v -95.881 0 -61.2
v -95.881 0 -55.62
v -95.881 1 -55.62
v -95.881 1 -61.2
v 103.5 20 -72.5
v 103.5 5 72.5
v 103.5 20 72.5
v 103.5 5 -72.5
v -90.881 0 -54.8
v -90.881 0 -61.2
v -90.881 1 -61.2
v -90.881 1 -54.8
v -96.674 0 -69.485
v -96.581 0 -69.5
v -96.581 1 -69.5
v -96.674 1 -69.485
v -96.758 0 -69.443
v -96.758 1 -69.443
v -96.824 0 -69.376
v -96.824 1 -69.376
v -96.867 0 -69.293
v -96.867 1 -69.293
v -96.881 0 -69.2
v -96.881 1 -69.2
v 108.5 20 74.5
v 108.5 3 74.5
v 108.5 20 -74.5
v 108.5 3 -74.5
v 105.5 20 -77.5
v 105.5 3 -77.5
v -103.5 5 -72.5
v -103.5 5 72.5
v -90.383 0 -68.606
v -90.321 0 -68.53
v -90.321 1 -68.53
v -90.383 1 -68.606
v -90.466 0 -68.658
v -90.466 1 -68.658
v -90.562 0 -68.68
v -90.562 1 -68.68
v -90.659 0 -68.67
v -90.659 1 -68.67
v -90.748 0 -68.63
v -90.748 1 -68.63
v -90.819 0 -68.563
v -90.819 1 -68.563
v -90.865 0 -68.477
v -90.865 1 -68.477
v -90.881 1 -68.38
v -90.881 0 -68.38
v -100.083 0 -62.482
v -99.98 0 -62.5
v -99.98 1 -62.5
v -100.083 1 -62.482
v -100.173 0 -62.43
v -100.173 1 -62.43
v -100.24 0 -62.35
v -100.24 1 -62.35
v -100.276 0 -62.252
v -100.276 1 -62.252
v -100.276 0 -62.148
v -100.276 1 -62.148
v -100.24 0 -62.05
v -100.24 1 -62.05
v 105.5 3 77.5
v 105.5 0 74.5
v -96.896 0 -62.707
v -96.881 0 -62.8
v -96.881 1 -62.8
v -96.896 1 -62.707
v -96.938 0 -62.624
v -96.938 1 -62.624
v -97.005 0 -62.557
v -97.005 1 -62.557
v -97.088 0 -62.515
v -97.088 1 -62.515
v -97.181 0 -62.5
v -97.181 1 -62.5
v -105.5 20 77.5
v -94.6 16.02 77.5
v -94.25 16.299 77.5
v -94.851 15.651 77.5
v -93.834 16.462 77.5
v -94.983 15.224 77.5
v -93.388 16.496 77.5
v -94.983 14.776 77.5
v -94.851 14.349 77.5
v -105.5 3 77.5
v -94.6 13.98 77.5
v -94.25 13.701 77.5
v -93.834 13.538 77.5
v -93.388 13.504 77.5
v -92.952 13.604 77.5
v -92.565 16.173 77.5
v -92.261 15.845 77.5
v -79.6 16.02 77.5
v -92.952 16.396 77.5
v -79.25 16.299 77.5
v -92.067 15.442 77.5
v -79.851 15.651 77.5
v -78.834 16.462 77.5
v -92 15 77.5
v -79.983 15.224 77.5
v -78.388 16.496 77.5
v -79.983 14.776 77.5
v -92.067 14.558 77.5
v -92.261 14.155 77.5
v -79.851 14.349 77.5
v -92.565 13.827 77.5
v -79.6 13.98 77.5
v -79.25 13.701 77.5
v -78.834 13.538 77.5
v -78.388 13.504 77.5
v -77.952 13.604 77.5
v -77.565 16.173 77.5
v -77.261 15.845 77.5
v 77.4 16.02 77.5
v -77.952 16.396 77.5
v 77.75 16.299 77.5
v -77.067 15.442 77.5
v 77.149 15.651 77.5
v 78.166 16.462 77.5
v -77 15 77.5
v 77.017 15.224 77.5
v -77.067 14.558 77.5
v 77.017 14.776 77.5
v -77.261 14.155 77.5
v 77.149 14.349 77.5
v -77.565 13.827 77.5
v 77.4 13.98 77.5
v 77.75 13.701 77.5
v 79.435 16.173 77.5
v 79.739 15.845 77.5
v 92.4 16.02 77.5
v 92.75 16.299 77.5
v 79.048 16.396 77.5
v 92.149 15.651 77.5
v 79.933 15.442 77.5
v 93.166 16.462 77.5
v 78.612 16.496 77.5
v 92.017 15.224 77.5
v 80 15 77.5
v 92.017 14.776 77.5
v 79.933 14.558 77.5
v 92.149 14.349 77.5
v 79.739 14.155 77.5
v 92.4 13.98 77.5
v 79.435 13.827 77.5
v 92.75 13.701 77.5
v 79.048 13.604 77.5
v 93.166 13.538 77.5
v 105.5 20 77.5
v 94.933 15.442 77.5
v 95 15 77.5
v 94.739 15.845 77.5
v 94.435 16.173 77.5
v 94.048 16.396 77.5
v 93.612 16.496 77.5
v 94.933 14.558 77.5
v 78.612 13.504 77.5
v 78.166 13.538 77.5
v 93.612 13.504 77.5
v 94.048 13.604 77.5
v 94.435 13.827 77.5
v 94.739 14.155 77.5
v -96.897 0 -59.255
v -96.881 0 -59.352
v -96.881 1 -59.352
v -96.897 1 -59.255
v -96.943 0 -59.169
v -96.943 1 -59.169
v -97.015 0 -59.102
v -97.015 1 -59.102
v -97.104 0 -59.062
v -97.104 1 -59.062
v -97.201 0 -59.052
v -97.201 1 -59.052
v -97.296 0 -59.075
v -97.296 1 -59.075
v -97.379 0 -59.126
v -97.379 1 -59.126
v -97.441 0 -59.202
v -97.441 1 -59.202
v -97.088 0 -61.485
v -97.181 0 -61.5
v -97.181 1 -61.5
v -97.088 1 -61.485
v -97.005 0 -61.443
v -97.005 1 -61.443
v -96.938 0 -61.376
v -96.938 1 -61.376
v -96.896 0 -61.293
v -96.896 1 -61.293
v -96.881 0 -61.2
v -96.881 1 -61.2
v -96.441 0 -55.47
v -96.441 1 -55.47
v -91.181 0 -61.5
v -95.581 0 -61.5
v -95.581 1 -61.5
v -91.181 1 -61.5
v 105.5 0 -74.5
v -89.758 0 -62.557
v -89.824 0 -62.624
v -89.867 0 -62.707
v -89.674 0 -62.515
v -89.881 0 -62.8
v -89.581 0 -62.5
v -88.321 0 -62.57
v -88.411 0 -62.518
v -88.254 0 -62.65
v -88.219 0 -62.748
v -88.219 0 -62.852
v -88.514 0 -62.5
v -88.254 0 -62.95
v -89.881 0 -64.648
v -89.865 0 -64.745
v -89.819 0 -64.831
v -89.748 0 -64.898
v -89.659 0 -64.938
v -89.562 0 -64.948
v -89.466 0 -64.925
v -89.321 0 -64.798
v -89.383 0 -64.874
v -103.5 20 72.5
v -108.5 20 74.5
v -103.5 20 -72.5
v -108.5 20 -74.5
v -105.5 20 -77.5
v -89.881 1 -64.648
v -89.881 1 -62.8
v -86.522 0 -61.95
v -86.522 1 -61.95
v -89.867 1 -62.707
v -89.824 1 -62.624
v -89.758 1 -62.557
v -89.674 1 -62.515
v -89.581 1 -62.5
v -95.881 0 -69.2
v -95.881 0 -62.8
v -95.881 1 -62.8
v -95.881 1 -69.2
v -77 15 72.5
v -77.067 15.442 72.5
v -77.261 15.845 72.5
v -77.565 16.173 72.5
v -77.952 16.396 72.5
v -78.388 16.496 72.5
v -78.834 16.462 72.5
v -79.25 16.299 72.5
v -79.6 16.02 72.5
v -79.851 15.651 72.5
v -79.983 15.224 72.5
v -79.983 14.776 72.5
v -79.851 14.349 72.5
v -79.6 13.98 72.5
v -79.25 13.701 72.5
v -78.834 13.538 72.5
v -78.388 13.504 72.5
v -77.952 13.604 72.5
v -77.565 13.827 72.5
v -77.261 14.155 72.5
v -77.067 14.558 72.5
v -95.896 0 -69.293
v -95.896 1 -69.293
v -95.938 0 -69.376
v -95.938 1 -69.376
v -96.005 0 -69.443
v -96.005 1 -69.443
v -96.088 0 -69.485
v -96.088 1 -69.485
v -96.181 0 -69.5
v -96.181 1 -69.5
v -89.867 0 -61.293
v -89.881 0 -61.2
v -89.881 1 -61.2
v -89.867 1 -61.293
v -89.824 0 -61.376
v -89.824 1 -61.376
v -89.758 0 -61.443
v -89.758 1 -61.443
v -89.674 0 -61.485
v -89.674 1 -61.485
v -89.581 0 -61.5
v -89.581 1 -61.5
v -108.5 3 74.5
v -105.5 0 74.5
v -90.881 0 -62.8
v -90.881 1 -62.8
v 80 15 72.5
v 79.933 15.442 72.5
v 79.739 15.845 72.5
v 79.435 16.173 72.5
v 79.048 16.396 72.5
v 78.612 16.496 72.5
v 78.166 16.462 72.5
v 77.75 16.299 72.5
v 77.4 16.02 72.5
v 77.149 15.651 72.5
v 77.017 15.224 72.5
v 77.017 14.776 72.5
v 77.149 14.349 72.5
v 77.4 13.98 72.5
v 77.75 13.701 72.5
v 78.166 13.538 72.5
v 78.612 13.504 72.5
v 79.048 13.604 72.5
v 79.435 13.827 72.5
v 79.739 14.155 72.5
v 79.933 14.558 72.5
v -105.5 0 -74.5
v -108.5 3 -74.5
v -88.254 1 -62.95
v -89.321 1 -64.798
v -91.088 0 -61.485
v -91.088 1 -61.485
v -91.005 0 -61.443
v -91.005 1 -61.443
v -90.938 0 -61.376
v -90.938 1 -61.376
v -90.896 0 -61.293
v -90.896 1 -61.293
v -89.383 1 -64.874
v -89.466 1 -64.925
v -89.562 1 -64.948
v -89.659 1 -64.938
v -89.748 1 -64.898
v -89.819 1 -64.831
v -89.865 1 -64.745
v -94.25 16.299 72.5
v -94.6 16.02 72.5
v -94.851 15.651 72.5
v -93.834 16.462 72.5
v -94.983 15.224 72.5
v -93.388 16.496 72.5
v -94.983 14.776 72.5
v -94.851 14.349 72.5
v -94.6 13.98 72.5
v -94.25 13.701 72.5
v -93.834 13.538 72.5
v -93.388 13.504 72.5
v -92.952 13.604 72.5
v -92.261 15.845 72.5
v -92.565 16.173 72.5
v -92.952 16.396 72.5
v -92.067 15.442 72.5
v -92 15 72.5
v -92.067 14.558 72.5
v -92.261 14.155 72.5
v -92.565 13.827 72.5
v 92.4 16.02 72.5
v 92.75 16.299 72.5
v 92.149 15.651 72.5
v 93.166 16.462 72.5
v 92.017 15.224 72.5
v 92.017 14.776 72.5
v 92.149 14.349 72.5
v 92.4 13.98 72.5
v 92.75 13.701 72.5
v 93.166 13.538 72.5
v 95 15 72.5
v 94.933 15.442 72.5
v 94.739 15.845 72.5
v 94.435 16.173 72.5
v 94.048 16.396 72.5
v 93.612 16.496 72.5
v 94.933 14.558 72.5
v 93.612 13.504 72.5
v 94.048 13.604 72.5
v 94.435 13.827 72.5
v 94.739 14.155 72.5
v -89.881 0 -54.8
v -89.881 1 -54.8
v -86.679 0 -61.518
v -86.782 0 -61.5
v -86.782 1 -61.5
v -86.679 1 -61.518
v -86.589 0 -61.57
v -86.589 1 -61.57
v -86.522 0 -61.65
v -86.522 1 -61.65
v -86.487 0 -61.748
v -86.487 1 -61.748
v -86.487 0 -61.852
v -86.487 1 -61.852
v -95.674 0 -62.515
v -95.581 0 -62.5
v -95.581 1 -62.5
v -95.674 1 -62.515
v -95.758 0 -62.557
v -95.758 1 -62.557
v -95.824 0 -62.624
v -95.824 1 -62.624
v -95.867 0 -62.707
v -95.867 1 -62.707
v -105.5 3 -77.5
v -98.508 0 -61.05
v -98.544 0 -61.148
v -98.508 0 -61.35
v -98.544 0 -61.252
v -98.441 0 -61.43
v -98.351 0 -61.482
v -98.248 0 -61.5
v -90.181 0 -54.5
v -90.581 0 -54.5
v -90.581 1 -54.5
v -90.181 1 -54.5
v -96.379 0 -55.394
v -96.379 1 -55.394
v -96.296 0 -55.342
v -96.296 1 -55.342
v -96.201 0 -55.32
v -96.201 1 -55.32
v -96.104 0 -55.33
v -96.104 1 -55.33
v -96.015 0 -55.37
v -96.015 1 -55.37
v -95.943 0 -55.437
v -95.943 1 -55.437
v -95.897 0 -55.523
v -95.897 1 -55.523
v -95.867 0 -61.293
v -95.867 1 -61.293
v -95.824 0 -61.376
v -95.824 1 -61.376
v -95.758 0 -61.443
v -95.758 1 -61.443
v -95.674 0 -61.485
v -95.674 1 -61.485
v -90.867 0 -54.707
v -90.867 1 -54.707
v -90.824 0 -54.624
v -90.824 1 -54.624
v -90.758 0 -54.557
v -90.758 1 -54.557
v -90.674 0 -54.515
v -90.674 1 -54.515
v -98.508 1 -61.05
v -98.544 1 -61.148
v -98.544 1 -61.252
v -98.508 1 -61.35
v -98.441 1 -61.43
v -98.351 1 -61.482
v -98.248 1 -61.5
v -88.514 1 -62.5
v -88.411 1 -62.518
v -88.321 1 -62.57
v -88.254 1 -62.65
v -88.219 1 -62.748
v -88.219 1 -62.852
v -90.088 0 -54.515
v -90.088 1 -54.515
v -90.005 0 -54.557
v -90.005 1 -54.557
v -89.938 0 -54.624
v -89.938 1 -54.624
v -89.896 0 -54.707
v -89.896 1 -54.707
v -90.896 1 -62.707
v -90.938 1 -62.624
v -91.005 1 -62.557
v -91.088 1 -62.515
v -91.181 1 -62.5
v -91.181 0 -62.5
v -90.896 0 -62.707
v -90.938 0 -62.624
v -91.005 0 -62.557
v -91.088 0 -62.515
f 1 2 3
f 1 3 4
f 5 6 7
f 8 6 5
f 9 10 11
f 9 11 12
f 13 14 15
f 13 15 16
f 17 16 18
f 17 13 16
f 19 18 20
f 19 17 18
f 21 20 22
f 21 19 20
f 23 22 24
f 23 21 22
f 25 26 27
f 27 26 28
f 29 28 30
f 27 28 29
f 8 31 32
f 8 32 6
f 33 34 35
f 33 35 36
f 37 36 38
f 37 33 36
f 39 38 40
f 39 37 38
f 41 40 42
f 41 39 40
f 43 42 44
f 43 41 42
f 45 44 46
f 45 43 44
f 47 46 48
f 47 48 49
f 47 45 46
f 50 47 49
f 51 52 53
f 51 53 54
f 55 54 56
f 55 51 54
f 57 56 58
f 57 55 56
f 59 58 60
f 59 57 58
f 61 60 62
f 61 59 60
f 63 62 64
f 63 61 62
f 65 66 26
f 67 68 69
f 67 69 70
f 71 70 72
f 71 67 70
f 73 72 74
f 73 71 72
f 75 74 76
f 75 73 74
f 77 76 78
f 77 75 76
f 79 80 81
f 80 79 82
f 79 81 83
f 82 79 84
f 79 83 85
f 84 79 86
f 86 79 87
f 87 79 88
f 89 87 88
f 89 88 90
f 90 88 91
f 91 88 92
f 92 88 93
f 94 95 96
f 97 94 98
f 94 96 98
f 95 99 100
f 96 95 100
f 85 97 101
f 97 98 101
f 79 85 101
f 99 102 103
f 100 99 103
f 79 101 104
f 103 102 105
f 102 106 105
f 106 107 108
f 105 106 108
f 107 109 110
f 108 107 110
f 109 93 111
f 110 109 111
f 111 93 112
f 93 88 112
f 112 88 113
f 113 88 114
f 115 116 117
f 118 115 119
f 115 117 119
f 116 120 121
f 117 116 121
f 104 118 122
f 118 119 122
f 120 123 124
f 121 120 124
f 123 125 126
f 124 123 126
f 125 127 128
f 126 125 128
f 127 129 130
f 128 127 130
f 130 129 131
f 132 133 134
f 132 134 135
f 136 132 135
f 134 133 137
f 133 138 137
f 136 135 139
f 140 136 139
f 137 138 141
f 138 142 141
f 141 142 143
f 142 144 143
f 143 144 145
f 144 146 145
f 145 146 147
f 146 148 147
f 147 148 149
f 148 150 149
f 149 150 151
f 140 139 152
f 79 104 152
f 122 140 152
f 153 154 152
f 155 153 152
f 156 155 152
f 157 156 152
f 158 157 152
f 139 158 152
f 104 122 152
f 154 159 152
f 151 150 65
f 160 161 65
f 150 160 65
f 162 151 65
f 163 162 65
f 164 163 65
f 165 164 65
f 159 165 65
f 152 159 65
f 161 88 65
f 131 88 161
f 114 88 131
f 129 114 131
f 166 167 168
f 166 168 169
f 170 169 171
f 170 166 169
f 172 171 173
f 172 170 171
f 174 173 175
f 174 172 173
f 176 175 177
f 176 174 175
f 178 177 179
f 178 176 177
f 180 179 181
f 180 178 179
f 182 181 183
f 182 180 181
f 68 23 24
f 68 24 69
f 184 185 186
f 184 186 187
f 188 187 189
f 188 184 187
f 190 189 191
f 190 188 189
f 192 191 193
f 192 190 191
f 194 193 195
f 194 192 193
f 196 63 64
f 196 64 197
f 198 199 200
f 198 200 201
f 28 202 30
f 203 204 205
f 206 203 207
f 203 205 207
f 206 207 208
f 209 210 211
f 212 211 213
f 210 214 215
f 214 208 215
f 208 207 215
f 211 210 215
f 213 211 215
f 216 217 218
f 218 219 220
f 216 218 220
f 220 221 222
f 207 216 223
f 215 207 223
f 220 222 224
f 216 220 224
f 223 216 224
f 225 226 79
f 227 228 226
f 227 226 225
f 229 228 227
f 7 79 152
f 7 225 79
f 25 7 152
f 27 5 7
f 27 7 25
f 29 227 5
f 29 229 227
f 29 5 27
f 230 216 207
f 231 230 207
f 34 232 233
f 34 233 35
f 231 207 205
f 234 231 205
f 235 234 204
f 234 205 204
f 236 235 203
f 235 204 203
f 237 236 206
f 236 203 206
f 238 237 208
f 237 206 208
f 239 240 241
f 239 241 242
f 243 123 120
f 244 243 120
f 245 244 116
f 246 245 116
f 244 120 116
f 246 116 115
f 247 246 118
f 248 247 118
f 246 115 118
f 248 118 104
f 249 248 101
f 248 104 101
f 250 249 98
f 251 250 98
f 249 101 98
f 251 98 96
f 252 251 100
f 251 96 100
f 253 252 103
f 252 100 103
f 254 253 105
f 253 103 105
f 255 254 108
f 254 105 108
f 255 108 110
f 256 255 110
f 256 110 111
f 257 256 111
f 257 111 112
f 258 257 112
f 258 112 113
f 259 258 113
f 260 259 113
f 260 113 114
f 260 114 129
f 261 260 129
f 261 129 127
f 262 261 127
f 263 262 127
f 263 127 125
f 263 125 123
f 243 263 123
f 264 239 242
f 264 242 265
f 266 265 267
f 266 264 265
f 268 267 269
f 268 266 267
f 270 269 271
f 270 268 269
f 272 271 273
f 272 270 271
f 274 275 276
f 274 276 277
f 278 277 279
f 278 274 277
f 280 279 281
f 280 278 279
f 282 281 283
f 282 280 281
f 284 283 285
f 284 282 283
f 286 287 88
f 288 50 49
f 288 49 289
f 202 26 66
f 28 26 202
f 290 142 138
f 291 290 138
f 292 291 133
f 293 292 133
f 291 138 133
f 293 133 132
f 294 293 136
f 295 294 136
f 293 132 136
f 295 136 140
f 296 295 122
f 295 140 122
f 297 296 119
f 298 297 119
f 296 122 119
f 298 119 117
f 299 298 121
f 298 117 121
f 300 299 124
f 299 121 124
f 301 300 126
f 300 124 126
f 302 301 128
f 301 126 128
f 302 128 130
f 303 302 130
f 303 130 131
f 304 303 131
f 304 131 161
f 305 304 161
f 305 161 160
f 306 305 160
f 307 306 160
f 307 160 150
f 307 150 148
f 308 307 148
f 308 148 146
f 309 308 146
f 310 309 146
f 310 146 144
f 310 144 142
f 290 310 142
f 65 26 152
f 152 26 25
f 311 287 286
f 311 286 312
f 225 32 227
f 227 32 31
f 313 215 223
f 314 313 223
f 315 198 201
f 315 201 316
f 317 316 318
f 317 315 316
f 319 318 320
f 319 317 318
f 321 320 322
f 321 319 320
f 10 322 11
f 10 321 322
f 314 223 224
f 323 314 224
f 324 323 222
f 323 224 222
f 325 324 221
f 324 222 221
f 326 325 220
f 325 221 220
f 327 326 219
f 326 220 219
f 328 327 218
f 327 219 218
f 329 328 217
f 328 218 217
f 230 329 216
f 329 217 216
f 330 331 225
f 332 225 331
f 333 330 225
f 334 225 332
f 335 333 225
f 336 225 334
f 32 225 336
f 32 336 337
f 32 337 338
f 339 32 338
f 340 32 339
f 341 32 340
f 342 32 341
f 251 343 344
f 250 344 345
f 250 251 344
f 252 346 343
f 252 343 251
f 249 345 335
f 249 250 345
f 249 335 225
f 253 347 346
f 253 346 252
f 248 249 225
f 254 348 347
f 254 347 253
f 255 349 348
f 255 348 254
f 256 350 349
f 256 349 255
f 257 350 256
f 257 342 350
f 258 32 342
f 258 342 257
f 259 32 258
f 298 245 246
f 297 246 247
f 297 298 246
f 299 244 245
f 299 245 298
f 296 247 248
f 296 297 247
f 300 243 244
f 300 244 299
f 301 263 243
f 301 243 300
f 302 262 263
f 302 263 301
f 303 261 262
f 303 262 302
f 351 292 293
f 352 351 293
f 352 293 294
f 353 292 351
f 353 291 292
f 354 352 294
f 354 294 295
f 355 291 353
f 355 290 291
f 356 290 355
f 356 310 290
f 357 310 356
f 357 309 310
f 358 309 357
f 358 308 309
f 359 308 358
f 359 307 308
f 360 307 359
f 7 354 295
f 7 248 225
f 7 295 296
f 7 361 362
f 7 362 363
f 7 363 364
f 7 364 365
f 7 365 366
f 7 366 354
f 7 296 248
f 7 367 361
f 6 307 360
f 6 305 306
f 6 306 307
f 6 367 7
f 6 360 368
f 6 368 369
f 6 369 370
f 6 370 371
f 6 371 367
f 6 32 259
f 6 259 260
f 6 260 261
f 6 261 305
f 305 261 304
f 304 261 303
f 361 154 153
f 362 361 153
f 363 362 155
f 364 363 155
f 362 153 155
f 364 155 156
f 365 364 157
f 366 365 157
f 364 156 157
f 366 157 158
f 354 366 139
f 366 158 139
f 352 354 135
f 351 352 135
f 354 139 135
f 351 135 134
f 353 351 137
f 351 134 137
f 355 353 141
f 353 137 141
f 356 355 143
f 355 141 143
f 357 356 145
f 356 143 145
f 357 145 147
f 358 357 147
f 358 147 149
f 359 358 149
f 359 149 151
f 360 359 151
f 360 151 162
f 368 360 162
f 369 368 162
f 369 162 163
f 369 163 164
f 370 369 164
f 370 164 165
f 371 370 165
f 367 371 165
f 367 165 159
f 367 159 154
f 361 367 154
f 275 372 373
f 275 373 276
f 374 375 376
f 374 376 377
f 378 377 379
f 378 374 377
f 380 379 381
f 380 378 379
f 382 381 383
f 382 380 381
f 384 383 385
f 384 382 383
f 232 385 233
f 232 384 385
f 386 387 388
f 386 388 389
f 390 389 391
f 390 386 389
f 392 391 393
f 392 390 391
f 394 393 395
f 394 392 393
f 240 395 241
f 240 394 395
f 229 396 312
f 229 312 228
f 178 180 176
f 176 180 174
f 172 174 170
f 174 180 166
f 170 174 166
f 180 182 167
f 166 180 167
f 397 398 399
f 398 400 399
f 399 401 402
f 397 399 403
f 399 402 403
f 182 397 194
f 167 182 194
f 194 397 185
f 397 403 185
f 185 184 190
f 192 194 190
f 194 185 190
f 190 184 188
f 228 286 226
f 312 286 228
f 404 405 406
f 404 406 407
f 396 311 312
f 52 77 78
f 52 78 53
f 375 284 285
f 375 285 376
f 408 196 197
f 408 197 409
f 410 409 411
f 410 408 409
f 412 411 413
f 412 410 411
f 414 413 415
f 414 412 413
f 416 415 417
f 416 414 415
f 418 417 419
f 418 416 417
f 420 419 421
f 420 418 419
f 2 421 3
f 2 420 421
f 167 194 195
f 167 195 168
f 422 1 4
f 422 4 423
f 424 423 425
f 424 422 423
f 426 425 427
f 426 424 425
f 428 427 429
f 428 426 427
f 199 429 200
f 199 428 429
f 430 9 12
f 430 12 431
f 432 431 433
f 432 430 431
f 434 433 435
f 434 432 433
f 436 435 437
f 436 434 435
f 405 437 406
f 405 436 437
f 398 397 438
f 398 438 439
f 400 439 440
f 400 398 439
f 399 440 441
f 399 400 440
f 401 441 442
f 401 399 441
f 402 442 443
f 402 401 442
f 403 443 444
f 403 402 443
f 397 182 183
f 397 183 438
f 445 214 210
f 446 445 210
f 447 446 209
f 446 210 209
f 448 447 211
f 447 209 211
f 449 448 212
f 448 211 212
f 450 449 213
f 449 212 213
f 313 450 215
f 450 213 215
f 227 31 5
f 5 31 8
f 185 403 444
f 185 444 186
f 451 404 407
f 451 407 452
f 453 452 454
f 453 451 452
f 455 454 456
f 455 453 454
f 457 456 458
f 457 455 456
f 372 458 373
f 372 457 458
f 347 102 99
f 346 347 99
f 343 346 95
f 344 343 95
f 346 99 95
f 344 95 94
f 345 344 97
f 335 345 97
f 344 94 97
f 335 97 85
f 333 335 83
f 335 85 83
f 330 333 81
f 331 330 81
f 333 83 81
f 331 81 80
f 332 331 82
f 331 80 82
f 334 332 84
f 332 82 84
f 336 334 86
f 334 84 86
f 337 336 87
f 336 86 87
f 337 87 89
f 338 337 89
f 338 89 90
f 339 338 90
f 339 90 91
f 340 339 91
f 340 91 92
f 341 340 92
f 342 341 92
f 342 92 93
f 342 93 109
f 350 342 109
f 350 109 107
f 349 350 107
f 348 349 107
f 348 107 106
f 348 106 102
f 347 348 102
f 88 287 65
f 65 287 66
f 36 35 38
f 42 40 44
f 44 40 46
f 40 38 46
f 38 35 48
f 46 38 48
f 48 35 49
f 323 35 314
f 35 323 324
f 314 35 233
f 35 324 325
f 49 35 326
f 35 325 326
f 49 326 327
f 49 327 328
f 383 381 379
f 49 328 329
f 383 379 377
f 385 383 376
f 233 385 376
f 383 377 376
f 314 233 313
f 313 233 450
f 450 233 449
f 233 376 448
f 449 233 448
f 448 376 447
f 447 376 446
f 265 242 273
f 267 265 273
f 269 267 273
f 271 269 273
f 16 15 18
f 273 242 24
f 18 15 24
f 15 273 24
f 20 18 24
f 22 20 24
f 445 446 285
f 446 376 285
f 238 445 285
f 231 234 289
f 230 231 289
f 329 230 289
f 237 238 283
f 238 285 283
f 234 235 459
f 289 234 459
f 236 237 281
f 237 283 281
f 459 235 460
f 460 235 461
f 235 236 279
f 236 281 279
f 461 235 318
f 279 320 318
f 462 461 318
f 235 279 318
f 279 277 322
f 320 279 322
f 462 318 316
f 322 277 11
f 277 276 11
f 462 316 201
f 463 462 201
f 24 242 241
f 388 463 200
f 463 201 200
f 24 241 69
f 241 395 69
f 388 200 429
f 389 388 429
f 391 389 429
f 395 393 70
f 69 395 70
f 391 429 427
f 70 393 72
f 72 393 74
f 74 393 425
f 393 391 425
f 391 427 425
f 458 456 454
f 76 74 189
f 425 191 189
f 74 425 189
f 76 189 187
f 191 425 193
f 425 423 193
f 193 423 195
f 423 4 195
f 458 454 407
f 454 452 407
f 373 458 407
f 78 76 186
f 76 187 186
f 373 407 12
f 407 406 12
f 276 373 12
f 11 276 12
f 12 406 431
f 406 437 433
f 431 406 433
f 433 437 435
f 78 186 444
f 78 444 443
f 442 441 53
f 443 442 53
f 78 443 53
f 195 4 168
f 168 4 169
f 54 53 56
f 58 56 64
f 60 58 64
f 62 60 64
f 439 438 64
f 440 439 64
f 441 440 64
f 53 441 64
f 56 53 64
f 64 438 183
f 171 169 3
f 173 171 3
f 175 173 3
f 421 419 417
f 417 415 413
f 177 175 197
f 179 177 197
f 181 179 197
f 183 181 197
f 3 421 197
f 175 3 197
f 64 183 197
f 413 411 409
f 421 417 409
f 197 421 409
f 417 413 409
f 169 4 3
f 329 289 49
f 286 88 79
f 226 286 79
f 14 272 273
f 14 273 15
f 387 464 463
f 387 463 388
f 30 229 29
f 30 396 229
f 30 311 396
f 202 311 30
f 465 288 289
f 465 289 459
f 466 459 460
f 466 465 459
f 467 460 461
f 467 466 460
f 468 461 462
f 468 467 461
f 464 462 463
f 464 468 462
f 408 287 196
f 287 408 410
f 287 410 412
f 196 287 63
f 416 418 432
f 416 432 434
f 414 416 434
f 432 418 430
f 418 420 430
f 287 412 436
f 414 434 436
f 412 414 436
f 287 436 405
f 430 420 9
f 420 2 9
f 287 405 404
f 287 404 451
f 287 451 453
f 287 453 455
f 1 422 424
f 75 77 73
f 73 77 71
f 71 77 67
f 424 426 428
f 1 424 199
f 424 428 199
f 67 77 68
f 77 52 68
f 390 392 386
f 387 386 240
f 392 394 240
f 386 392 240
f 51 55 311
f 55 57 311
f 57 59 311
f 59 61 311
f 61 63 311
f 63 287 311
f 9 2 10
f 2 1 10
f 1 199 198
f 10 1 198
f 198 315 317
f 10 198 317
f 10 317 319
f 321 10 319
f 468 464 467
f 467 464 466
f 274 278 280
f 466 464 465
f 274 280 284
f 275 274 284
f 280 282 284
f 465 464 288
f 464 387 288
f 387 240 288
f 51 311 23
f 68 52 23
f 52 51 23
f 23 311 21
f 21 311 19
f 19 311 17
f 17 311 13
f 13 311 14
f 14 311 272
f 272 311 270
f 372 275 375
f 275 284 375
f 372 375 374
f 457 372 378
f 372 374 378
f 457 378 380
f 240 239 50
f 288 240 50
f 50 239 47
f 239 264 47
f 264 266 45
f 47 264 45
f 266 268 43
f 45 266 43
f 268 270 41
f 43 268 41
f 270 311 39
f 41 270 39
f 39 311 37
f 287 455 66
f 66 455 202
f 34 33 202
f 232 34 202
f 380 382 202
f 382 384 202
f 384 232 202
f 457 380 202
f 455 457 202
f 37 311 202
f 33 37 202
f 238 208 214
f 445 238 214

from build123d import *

# Parameters (mm, degrees)
SKIZZE2_W                       = 217
SKIZZE2_H                       = 155
AUFSATZ_LINEAR_AUSTRAGEN1_DEPTH = 20
WANDUNG1_T                      = -5
SCHNITT_LINEAR_AUSTRAGEN1_REACH = 192.256
SKIZZE7_R                       = 1.5
FASE1_SIZE                      = 3
SCHNITT_LINEAR_AUSTRAGEN2_DEPTH = 1


with BuildPart() as part:
    # Skizze2 → Aufsatz-Linear austragen1 (new body)
    with BuildSketch(Plane(origin=(0, 0, 0), x_dir=(1, 0, 0), z_dir=(0, 1, 0))):
        Rectangle(SKIZZE2_W, SKIZZE2_H)
    extrude(amount=AUFSATZ_LINEAR_AUSTRAGEN1_DEPTH)

    # Wandung1
    wandung1_openings = [part.faces().sort_by_distance(p)[0] for p in [
        (0, 20, 0),
    ]]
    offset(amount=WANDUNG1_T, openings=wandung1_openings, kind=Kind.INTERSECTION)

    # Skizze7 → Schnitt-Linear austragen1 (cut, up to next)
    with BuildSketch(Plane.XY.offset(77.5), mode=Mode.PRIVATE) as schnitt_linear_austragen1_sk1:
        with Locations((-93.5, 15)):
            Circle(SKIZZE7_R)
    schnitt_linear_austragen1_tool1 = extrude(schnitt_linear_austragen1_sk1.sketch, amount=-SCHNITT_LINEAR_AUSTRAGEN1_REACH, mode=Mode.PRIVATE) & part.part
    # Skizze7 → Schnitt-Linear austragen1 (cut, up to next)
    with BuildSketch(Plane.XY.offset(77.5), mode=Mode.PRIVATE) as schnitt_linear_austragen1_sk2:
        with Locations((-78.5, 15)):
            Circle(SKIZZE7_R)
    schnitt_linear_austragen1_tool2 = extrude(schnitt_linear_austragen1_sk2.sketch, amount=-SCHNITT_LINEAR_AUSTRAGEN1_REACH, mode=Mode.PRIVATE) & part.part
    # Skizze7 → Schnitt-Linear austragen1 (cut, up to next)
    with BuildSketch(Plane.XY.offset(77.5), mode=Mode.PRIVATE) as schnitt_linear_austragen1_sk3:
        with Locations((78.5, 15)):
            Circle(SKIZZE7_R)
    schnitt_linear_austragen1_tool3 = extrude(schnitt_linear_austragen1_sk3.sketch, amount=-SCHNITT_LINEAR_AUSTRAGEN1_REACH, mode=Mode.PRIVATE) & part.part
    # Skizze7 → Schnitt-Linear austragen1 (cut, up to next)
    with BuildSketch(Plane.XY.offset(77.5), mode=Mode.PRIVATE) as schnitt_linear_austragen1_sk4:
        with Locations((93.5, 15)):
            Circle(SKIZZE7_R)
    schnitt_linear_austragen1_tool4 = extrude(schnitt_linear_austragen1_sk4.sketch, amount=-SCHNITT_LINEAR_AUSTRAGEN1_REACH, mode=Mode.PRIVATE) & part.part
    add(schnitt_linear_austragen1_tool1.solids().sort_by_distance((-93.5, 15, 77.5))[0], mode=Mode.SUBTRACT)
    add(schnitt_linear_austragen1_tool2.solids().sort_by_distance((-78.5, 15, 77.5))[0], mode=Mode.SUBTRACT)
    add(schnitt_linear_austragen1_tool3.solids().sort_by_distance((78.5, 15, 77.5))[0], mode=Mode.SUBTRACT)
    add(schnitt_linear_austragen1_tool4.solids().sort_by_distance((93.5, 15, 77.5))[0], mode=Mode.SUBTRACT)

    # Fase1
    fase1_edges = [part.edges().sort_by_distance(p)[0] for p in [
        (0, 0, 77.5),
        (-108.5, 0, 0),
        (0, 0, -77.5),
        (108.5, 0, 0),
        (108.5, 10, 77.5),
        (-108.5, 10, 77.5),
        (-108.5, 10, -77.5),
        (108.5, 10, -77.5),
    ]]
    chamfer(fase1_edges, length=FASE1_SIZE)

    # Skizze8 → Schnitt-Linear austragen2 (cut)
    with BuildSketch(Plane.XZ):
        with BuildLine():
            Line((-96.881197846, -69.2), (-96.881197846, -62.8))
            ThreePointArc((-96.881197846, -62.8), (-96.969065812, -62.587867966), (-97.181197846, -62.5))
            Line((-97.181197846, -62.5), (-99.980384758, -62.5))
            ThreePointArc((-99.980384758, -62.5), (-100.240192379, -62.35), (-100.240192379, -62.05))
            Line((-100.240192379, -62.05), (-96.441005468, -55.469615242))
            ThreePointArc((-96.441005468, -55.469615242), (-96.103552133, -55.329837494), (-95.881197846, -55.619615242))
            Line((-95.881197846, -55.619615242), (-95.881197846, -61.2))
            ThreePointArc((-95.881197846, -61.2), (-95.793329881, -61.412132034), (-95.581197846, -61.5))
            Line((-95.581197846, -61.5), (-91.181197846, -61.5))
            ThreePointArc((-91.181197846, -61.5), (-90.969065812, -61.412132034), (-90.881197846, -61.2))
            Line((-90.881197846, -61.2), (-90.881197846, -54.8))
            ThreePointArc((-90.881197846, -54.8), (-90.793329881, -54.587867966), (-90.581197846, -54.5))
            Line((-90.581197846, -54.5), (-90.181197846, -54.5))
            ThreePointArc((-90.181197846, -54.5), (-89.969065812, -54.587867966), (-89.881197846, -54.8))
            Line((-89.881197846, -54.8), (-89.881197846, -61.2))
            ThreePointArc((-89.881197846, -61.2), (-89.793329881, -61.412132034), (-89.581197846, -61.5))
            Line((-89.581197846, -61.5), (-86.782010935, -61.5))
            ThreePointArc((-86.782010935, -61.5), (-86.522203314, -61.65), (-86.522203314, -61.95))
            Line((-86.522203314, -61.95), (-90.321390225, -68.530384758))
            ThreePointArc((-90.321390225, -68.530384758), (-90.65884356, -68.670162506), (-90.881197846, -68.380384758))
            Line((-90.881197846, -68.380384758), (-90.881197846, -62.8))
            ThreePointArc((-90.881197846, -62.8), (-90.969065812, -62.587867966), (-91.181197846, -62.5))
            Line((-91.181197846, -62.5), (-95.581197846, -62.5))
            ThreePointArc((-95.581197846, -62.5), (-95.793329881, -62.587867966), (-95.881197846, -62.8))
            Line((-95.881197846, -62.8), (-95.881197846, -69.2))
            ThreePointArc((-95.881197846, -69.2), (-95.969065812, -69.412132034), (-96.181197846, -69.5))
            Line((-96.181197846, -69.5), (-96.581197846, -69.5))
            ThreePointArc((-96.581197846, -69.5), (-96.793329881, -69.412132034), (-96.881197846, -69.2))
        make_face()
        with BuildLine():
            Line((-97.441005468, -59.20166605), (-98.508141571, -61.05))
            ThreePointArc((-98.508141571, -61.05), (-98.508141571, -61.35), (-98.24833395, -61.5))
            Line((-98.24833395, -61.5), (-97.181197846, -61.5))
            ThreePointArc((-97.181197846, -61.5), (-96.969065812, -61.412132034), (-96.881197846, -61.2))
            Line((-96.881197846, -61.2), (-96.881197846, -59.35166605))
            ThreePointArc((-96.881197846, -59.35166605), (-97.103552133, -59.061888302), (-97.441005468, -59.20166605))
        make_face(mode=Mode.SUBTRACT)
        with BuildLine():
            Line((-88.254254122, -62.95), (-89.321390225, -64.79833395))
            ThreePointArc((-89.321390225, -64.79833395), (-89.65884356, -64.938111698), (-89.881197846, -64.64833395))
            Line((-89.881197846, -64.64833395), (-89.881197846, -62.8))
            ThreePointArc((-89.881197846, -62.8), (-89.793329881, -62.587867966), (-89.581197846, -62.5))
            Line((-89.581197846, -62.5), (-88.514061743, -62.5))
            ThreePointArc((-88.514061743, -62.5), (-88.254254122, -62.65), (-88.254254122, -62.95))
        make_face(mode=Mode.SUBTRACT)
    extrude(amount=-SCHNITT_LINEAR_AUSTRAGEN2_DEPTH, mode=Mode.SUBTRACT)


solid = part.part
